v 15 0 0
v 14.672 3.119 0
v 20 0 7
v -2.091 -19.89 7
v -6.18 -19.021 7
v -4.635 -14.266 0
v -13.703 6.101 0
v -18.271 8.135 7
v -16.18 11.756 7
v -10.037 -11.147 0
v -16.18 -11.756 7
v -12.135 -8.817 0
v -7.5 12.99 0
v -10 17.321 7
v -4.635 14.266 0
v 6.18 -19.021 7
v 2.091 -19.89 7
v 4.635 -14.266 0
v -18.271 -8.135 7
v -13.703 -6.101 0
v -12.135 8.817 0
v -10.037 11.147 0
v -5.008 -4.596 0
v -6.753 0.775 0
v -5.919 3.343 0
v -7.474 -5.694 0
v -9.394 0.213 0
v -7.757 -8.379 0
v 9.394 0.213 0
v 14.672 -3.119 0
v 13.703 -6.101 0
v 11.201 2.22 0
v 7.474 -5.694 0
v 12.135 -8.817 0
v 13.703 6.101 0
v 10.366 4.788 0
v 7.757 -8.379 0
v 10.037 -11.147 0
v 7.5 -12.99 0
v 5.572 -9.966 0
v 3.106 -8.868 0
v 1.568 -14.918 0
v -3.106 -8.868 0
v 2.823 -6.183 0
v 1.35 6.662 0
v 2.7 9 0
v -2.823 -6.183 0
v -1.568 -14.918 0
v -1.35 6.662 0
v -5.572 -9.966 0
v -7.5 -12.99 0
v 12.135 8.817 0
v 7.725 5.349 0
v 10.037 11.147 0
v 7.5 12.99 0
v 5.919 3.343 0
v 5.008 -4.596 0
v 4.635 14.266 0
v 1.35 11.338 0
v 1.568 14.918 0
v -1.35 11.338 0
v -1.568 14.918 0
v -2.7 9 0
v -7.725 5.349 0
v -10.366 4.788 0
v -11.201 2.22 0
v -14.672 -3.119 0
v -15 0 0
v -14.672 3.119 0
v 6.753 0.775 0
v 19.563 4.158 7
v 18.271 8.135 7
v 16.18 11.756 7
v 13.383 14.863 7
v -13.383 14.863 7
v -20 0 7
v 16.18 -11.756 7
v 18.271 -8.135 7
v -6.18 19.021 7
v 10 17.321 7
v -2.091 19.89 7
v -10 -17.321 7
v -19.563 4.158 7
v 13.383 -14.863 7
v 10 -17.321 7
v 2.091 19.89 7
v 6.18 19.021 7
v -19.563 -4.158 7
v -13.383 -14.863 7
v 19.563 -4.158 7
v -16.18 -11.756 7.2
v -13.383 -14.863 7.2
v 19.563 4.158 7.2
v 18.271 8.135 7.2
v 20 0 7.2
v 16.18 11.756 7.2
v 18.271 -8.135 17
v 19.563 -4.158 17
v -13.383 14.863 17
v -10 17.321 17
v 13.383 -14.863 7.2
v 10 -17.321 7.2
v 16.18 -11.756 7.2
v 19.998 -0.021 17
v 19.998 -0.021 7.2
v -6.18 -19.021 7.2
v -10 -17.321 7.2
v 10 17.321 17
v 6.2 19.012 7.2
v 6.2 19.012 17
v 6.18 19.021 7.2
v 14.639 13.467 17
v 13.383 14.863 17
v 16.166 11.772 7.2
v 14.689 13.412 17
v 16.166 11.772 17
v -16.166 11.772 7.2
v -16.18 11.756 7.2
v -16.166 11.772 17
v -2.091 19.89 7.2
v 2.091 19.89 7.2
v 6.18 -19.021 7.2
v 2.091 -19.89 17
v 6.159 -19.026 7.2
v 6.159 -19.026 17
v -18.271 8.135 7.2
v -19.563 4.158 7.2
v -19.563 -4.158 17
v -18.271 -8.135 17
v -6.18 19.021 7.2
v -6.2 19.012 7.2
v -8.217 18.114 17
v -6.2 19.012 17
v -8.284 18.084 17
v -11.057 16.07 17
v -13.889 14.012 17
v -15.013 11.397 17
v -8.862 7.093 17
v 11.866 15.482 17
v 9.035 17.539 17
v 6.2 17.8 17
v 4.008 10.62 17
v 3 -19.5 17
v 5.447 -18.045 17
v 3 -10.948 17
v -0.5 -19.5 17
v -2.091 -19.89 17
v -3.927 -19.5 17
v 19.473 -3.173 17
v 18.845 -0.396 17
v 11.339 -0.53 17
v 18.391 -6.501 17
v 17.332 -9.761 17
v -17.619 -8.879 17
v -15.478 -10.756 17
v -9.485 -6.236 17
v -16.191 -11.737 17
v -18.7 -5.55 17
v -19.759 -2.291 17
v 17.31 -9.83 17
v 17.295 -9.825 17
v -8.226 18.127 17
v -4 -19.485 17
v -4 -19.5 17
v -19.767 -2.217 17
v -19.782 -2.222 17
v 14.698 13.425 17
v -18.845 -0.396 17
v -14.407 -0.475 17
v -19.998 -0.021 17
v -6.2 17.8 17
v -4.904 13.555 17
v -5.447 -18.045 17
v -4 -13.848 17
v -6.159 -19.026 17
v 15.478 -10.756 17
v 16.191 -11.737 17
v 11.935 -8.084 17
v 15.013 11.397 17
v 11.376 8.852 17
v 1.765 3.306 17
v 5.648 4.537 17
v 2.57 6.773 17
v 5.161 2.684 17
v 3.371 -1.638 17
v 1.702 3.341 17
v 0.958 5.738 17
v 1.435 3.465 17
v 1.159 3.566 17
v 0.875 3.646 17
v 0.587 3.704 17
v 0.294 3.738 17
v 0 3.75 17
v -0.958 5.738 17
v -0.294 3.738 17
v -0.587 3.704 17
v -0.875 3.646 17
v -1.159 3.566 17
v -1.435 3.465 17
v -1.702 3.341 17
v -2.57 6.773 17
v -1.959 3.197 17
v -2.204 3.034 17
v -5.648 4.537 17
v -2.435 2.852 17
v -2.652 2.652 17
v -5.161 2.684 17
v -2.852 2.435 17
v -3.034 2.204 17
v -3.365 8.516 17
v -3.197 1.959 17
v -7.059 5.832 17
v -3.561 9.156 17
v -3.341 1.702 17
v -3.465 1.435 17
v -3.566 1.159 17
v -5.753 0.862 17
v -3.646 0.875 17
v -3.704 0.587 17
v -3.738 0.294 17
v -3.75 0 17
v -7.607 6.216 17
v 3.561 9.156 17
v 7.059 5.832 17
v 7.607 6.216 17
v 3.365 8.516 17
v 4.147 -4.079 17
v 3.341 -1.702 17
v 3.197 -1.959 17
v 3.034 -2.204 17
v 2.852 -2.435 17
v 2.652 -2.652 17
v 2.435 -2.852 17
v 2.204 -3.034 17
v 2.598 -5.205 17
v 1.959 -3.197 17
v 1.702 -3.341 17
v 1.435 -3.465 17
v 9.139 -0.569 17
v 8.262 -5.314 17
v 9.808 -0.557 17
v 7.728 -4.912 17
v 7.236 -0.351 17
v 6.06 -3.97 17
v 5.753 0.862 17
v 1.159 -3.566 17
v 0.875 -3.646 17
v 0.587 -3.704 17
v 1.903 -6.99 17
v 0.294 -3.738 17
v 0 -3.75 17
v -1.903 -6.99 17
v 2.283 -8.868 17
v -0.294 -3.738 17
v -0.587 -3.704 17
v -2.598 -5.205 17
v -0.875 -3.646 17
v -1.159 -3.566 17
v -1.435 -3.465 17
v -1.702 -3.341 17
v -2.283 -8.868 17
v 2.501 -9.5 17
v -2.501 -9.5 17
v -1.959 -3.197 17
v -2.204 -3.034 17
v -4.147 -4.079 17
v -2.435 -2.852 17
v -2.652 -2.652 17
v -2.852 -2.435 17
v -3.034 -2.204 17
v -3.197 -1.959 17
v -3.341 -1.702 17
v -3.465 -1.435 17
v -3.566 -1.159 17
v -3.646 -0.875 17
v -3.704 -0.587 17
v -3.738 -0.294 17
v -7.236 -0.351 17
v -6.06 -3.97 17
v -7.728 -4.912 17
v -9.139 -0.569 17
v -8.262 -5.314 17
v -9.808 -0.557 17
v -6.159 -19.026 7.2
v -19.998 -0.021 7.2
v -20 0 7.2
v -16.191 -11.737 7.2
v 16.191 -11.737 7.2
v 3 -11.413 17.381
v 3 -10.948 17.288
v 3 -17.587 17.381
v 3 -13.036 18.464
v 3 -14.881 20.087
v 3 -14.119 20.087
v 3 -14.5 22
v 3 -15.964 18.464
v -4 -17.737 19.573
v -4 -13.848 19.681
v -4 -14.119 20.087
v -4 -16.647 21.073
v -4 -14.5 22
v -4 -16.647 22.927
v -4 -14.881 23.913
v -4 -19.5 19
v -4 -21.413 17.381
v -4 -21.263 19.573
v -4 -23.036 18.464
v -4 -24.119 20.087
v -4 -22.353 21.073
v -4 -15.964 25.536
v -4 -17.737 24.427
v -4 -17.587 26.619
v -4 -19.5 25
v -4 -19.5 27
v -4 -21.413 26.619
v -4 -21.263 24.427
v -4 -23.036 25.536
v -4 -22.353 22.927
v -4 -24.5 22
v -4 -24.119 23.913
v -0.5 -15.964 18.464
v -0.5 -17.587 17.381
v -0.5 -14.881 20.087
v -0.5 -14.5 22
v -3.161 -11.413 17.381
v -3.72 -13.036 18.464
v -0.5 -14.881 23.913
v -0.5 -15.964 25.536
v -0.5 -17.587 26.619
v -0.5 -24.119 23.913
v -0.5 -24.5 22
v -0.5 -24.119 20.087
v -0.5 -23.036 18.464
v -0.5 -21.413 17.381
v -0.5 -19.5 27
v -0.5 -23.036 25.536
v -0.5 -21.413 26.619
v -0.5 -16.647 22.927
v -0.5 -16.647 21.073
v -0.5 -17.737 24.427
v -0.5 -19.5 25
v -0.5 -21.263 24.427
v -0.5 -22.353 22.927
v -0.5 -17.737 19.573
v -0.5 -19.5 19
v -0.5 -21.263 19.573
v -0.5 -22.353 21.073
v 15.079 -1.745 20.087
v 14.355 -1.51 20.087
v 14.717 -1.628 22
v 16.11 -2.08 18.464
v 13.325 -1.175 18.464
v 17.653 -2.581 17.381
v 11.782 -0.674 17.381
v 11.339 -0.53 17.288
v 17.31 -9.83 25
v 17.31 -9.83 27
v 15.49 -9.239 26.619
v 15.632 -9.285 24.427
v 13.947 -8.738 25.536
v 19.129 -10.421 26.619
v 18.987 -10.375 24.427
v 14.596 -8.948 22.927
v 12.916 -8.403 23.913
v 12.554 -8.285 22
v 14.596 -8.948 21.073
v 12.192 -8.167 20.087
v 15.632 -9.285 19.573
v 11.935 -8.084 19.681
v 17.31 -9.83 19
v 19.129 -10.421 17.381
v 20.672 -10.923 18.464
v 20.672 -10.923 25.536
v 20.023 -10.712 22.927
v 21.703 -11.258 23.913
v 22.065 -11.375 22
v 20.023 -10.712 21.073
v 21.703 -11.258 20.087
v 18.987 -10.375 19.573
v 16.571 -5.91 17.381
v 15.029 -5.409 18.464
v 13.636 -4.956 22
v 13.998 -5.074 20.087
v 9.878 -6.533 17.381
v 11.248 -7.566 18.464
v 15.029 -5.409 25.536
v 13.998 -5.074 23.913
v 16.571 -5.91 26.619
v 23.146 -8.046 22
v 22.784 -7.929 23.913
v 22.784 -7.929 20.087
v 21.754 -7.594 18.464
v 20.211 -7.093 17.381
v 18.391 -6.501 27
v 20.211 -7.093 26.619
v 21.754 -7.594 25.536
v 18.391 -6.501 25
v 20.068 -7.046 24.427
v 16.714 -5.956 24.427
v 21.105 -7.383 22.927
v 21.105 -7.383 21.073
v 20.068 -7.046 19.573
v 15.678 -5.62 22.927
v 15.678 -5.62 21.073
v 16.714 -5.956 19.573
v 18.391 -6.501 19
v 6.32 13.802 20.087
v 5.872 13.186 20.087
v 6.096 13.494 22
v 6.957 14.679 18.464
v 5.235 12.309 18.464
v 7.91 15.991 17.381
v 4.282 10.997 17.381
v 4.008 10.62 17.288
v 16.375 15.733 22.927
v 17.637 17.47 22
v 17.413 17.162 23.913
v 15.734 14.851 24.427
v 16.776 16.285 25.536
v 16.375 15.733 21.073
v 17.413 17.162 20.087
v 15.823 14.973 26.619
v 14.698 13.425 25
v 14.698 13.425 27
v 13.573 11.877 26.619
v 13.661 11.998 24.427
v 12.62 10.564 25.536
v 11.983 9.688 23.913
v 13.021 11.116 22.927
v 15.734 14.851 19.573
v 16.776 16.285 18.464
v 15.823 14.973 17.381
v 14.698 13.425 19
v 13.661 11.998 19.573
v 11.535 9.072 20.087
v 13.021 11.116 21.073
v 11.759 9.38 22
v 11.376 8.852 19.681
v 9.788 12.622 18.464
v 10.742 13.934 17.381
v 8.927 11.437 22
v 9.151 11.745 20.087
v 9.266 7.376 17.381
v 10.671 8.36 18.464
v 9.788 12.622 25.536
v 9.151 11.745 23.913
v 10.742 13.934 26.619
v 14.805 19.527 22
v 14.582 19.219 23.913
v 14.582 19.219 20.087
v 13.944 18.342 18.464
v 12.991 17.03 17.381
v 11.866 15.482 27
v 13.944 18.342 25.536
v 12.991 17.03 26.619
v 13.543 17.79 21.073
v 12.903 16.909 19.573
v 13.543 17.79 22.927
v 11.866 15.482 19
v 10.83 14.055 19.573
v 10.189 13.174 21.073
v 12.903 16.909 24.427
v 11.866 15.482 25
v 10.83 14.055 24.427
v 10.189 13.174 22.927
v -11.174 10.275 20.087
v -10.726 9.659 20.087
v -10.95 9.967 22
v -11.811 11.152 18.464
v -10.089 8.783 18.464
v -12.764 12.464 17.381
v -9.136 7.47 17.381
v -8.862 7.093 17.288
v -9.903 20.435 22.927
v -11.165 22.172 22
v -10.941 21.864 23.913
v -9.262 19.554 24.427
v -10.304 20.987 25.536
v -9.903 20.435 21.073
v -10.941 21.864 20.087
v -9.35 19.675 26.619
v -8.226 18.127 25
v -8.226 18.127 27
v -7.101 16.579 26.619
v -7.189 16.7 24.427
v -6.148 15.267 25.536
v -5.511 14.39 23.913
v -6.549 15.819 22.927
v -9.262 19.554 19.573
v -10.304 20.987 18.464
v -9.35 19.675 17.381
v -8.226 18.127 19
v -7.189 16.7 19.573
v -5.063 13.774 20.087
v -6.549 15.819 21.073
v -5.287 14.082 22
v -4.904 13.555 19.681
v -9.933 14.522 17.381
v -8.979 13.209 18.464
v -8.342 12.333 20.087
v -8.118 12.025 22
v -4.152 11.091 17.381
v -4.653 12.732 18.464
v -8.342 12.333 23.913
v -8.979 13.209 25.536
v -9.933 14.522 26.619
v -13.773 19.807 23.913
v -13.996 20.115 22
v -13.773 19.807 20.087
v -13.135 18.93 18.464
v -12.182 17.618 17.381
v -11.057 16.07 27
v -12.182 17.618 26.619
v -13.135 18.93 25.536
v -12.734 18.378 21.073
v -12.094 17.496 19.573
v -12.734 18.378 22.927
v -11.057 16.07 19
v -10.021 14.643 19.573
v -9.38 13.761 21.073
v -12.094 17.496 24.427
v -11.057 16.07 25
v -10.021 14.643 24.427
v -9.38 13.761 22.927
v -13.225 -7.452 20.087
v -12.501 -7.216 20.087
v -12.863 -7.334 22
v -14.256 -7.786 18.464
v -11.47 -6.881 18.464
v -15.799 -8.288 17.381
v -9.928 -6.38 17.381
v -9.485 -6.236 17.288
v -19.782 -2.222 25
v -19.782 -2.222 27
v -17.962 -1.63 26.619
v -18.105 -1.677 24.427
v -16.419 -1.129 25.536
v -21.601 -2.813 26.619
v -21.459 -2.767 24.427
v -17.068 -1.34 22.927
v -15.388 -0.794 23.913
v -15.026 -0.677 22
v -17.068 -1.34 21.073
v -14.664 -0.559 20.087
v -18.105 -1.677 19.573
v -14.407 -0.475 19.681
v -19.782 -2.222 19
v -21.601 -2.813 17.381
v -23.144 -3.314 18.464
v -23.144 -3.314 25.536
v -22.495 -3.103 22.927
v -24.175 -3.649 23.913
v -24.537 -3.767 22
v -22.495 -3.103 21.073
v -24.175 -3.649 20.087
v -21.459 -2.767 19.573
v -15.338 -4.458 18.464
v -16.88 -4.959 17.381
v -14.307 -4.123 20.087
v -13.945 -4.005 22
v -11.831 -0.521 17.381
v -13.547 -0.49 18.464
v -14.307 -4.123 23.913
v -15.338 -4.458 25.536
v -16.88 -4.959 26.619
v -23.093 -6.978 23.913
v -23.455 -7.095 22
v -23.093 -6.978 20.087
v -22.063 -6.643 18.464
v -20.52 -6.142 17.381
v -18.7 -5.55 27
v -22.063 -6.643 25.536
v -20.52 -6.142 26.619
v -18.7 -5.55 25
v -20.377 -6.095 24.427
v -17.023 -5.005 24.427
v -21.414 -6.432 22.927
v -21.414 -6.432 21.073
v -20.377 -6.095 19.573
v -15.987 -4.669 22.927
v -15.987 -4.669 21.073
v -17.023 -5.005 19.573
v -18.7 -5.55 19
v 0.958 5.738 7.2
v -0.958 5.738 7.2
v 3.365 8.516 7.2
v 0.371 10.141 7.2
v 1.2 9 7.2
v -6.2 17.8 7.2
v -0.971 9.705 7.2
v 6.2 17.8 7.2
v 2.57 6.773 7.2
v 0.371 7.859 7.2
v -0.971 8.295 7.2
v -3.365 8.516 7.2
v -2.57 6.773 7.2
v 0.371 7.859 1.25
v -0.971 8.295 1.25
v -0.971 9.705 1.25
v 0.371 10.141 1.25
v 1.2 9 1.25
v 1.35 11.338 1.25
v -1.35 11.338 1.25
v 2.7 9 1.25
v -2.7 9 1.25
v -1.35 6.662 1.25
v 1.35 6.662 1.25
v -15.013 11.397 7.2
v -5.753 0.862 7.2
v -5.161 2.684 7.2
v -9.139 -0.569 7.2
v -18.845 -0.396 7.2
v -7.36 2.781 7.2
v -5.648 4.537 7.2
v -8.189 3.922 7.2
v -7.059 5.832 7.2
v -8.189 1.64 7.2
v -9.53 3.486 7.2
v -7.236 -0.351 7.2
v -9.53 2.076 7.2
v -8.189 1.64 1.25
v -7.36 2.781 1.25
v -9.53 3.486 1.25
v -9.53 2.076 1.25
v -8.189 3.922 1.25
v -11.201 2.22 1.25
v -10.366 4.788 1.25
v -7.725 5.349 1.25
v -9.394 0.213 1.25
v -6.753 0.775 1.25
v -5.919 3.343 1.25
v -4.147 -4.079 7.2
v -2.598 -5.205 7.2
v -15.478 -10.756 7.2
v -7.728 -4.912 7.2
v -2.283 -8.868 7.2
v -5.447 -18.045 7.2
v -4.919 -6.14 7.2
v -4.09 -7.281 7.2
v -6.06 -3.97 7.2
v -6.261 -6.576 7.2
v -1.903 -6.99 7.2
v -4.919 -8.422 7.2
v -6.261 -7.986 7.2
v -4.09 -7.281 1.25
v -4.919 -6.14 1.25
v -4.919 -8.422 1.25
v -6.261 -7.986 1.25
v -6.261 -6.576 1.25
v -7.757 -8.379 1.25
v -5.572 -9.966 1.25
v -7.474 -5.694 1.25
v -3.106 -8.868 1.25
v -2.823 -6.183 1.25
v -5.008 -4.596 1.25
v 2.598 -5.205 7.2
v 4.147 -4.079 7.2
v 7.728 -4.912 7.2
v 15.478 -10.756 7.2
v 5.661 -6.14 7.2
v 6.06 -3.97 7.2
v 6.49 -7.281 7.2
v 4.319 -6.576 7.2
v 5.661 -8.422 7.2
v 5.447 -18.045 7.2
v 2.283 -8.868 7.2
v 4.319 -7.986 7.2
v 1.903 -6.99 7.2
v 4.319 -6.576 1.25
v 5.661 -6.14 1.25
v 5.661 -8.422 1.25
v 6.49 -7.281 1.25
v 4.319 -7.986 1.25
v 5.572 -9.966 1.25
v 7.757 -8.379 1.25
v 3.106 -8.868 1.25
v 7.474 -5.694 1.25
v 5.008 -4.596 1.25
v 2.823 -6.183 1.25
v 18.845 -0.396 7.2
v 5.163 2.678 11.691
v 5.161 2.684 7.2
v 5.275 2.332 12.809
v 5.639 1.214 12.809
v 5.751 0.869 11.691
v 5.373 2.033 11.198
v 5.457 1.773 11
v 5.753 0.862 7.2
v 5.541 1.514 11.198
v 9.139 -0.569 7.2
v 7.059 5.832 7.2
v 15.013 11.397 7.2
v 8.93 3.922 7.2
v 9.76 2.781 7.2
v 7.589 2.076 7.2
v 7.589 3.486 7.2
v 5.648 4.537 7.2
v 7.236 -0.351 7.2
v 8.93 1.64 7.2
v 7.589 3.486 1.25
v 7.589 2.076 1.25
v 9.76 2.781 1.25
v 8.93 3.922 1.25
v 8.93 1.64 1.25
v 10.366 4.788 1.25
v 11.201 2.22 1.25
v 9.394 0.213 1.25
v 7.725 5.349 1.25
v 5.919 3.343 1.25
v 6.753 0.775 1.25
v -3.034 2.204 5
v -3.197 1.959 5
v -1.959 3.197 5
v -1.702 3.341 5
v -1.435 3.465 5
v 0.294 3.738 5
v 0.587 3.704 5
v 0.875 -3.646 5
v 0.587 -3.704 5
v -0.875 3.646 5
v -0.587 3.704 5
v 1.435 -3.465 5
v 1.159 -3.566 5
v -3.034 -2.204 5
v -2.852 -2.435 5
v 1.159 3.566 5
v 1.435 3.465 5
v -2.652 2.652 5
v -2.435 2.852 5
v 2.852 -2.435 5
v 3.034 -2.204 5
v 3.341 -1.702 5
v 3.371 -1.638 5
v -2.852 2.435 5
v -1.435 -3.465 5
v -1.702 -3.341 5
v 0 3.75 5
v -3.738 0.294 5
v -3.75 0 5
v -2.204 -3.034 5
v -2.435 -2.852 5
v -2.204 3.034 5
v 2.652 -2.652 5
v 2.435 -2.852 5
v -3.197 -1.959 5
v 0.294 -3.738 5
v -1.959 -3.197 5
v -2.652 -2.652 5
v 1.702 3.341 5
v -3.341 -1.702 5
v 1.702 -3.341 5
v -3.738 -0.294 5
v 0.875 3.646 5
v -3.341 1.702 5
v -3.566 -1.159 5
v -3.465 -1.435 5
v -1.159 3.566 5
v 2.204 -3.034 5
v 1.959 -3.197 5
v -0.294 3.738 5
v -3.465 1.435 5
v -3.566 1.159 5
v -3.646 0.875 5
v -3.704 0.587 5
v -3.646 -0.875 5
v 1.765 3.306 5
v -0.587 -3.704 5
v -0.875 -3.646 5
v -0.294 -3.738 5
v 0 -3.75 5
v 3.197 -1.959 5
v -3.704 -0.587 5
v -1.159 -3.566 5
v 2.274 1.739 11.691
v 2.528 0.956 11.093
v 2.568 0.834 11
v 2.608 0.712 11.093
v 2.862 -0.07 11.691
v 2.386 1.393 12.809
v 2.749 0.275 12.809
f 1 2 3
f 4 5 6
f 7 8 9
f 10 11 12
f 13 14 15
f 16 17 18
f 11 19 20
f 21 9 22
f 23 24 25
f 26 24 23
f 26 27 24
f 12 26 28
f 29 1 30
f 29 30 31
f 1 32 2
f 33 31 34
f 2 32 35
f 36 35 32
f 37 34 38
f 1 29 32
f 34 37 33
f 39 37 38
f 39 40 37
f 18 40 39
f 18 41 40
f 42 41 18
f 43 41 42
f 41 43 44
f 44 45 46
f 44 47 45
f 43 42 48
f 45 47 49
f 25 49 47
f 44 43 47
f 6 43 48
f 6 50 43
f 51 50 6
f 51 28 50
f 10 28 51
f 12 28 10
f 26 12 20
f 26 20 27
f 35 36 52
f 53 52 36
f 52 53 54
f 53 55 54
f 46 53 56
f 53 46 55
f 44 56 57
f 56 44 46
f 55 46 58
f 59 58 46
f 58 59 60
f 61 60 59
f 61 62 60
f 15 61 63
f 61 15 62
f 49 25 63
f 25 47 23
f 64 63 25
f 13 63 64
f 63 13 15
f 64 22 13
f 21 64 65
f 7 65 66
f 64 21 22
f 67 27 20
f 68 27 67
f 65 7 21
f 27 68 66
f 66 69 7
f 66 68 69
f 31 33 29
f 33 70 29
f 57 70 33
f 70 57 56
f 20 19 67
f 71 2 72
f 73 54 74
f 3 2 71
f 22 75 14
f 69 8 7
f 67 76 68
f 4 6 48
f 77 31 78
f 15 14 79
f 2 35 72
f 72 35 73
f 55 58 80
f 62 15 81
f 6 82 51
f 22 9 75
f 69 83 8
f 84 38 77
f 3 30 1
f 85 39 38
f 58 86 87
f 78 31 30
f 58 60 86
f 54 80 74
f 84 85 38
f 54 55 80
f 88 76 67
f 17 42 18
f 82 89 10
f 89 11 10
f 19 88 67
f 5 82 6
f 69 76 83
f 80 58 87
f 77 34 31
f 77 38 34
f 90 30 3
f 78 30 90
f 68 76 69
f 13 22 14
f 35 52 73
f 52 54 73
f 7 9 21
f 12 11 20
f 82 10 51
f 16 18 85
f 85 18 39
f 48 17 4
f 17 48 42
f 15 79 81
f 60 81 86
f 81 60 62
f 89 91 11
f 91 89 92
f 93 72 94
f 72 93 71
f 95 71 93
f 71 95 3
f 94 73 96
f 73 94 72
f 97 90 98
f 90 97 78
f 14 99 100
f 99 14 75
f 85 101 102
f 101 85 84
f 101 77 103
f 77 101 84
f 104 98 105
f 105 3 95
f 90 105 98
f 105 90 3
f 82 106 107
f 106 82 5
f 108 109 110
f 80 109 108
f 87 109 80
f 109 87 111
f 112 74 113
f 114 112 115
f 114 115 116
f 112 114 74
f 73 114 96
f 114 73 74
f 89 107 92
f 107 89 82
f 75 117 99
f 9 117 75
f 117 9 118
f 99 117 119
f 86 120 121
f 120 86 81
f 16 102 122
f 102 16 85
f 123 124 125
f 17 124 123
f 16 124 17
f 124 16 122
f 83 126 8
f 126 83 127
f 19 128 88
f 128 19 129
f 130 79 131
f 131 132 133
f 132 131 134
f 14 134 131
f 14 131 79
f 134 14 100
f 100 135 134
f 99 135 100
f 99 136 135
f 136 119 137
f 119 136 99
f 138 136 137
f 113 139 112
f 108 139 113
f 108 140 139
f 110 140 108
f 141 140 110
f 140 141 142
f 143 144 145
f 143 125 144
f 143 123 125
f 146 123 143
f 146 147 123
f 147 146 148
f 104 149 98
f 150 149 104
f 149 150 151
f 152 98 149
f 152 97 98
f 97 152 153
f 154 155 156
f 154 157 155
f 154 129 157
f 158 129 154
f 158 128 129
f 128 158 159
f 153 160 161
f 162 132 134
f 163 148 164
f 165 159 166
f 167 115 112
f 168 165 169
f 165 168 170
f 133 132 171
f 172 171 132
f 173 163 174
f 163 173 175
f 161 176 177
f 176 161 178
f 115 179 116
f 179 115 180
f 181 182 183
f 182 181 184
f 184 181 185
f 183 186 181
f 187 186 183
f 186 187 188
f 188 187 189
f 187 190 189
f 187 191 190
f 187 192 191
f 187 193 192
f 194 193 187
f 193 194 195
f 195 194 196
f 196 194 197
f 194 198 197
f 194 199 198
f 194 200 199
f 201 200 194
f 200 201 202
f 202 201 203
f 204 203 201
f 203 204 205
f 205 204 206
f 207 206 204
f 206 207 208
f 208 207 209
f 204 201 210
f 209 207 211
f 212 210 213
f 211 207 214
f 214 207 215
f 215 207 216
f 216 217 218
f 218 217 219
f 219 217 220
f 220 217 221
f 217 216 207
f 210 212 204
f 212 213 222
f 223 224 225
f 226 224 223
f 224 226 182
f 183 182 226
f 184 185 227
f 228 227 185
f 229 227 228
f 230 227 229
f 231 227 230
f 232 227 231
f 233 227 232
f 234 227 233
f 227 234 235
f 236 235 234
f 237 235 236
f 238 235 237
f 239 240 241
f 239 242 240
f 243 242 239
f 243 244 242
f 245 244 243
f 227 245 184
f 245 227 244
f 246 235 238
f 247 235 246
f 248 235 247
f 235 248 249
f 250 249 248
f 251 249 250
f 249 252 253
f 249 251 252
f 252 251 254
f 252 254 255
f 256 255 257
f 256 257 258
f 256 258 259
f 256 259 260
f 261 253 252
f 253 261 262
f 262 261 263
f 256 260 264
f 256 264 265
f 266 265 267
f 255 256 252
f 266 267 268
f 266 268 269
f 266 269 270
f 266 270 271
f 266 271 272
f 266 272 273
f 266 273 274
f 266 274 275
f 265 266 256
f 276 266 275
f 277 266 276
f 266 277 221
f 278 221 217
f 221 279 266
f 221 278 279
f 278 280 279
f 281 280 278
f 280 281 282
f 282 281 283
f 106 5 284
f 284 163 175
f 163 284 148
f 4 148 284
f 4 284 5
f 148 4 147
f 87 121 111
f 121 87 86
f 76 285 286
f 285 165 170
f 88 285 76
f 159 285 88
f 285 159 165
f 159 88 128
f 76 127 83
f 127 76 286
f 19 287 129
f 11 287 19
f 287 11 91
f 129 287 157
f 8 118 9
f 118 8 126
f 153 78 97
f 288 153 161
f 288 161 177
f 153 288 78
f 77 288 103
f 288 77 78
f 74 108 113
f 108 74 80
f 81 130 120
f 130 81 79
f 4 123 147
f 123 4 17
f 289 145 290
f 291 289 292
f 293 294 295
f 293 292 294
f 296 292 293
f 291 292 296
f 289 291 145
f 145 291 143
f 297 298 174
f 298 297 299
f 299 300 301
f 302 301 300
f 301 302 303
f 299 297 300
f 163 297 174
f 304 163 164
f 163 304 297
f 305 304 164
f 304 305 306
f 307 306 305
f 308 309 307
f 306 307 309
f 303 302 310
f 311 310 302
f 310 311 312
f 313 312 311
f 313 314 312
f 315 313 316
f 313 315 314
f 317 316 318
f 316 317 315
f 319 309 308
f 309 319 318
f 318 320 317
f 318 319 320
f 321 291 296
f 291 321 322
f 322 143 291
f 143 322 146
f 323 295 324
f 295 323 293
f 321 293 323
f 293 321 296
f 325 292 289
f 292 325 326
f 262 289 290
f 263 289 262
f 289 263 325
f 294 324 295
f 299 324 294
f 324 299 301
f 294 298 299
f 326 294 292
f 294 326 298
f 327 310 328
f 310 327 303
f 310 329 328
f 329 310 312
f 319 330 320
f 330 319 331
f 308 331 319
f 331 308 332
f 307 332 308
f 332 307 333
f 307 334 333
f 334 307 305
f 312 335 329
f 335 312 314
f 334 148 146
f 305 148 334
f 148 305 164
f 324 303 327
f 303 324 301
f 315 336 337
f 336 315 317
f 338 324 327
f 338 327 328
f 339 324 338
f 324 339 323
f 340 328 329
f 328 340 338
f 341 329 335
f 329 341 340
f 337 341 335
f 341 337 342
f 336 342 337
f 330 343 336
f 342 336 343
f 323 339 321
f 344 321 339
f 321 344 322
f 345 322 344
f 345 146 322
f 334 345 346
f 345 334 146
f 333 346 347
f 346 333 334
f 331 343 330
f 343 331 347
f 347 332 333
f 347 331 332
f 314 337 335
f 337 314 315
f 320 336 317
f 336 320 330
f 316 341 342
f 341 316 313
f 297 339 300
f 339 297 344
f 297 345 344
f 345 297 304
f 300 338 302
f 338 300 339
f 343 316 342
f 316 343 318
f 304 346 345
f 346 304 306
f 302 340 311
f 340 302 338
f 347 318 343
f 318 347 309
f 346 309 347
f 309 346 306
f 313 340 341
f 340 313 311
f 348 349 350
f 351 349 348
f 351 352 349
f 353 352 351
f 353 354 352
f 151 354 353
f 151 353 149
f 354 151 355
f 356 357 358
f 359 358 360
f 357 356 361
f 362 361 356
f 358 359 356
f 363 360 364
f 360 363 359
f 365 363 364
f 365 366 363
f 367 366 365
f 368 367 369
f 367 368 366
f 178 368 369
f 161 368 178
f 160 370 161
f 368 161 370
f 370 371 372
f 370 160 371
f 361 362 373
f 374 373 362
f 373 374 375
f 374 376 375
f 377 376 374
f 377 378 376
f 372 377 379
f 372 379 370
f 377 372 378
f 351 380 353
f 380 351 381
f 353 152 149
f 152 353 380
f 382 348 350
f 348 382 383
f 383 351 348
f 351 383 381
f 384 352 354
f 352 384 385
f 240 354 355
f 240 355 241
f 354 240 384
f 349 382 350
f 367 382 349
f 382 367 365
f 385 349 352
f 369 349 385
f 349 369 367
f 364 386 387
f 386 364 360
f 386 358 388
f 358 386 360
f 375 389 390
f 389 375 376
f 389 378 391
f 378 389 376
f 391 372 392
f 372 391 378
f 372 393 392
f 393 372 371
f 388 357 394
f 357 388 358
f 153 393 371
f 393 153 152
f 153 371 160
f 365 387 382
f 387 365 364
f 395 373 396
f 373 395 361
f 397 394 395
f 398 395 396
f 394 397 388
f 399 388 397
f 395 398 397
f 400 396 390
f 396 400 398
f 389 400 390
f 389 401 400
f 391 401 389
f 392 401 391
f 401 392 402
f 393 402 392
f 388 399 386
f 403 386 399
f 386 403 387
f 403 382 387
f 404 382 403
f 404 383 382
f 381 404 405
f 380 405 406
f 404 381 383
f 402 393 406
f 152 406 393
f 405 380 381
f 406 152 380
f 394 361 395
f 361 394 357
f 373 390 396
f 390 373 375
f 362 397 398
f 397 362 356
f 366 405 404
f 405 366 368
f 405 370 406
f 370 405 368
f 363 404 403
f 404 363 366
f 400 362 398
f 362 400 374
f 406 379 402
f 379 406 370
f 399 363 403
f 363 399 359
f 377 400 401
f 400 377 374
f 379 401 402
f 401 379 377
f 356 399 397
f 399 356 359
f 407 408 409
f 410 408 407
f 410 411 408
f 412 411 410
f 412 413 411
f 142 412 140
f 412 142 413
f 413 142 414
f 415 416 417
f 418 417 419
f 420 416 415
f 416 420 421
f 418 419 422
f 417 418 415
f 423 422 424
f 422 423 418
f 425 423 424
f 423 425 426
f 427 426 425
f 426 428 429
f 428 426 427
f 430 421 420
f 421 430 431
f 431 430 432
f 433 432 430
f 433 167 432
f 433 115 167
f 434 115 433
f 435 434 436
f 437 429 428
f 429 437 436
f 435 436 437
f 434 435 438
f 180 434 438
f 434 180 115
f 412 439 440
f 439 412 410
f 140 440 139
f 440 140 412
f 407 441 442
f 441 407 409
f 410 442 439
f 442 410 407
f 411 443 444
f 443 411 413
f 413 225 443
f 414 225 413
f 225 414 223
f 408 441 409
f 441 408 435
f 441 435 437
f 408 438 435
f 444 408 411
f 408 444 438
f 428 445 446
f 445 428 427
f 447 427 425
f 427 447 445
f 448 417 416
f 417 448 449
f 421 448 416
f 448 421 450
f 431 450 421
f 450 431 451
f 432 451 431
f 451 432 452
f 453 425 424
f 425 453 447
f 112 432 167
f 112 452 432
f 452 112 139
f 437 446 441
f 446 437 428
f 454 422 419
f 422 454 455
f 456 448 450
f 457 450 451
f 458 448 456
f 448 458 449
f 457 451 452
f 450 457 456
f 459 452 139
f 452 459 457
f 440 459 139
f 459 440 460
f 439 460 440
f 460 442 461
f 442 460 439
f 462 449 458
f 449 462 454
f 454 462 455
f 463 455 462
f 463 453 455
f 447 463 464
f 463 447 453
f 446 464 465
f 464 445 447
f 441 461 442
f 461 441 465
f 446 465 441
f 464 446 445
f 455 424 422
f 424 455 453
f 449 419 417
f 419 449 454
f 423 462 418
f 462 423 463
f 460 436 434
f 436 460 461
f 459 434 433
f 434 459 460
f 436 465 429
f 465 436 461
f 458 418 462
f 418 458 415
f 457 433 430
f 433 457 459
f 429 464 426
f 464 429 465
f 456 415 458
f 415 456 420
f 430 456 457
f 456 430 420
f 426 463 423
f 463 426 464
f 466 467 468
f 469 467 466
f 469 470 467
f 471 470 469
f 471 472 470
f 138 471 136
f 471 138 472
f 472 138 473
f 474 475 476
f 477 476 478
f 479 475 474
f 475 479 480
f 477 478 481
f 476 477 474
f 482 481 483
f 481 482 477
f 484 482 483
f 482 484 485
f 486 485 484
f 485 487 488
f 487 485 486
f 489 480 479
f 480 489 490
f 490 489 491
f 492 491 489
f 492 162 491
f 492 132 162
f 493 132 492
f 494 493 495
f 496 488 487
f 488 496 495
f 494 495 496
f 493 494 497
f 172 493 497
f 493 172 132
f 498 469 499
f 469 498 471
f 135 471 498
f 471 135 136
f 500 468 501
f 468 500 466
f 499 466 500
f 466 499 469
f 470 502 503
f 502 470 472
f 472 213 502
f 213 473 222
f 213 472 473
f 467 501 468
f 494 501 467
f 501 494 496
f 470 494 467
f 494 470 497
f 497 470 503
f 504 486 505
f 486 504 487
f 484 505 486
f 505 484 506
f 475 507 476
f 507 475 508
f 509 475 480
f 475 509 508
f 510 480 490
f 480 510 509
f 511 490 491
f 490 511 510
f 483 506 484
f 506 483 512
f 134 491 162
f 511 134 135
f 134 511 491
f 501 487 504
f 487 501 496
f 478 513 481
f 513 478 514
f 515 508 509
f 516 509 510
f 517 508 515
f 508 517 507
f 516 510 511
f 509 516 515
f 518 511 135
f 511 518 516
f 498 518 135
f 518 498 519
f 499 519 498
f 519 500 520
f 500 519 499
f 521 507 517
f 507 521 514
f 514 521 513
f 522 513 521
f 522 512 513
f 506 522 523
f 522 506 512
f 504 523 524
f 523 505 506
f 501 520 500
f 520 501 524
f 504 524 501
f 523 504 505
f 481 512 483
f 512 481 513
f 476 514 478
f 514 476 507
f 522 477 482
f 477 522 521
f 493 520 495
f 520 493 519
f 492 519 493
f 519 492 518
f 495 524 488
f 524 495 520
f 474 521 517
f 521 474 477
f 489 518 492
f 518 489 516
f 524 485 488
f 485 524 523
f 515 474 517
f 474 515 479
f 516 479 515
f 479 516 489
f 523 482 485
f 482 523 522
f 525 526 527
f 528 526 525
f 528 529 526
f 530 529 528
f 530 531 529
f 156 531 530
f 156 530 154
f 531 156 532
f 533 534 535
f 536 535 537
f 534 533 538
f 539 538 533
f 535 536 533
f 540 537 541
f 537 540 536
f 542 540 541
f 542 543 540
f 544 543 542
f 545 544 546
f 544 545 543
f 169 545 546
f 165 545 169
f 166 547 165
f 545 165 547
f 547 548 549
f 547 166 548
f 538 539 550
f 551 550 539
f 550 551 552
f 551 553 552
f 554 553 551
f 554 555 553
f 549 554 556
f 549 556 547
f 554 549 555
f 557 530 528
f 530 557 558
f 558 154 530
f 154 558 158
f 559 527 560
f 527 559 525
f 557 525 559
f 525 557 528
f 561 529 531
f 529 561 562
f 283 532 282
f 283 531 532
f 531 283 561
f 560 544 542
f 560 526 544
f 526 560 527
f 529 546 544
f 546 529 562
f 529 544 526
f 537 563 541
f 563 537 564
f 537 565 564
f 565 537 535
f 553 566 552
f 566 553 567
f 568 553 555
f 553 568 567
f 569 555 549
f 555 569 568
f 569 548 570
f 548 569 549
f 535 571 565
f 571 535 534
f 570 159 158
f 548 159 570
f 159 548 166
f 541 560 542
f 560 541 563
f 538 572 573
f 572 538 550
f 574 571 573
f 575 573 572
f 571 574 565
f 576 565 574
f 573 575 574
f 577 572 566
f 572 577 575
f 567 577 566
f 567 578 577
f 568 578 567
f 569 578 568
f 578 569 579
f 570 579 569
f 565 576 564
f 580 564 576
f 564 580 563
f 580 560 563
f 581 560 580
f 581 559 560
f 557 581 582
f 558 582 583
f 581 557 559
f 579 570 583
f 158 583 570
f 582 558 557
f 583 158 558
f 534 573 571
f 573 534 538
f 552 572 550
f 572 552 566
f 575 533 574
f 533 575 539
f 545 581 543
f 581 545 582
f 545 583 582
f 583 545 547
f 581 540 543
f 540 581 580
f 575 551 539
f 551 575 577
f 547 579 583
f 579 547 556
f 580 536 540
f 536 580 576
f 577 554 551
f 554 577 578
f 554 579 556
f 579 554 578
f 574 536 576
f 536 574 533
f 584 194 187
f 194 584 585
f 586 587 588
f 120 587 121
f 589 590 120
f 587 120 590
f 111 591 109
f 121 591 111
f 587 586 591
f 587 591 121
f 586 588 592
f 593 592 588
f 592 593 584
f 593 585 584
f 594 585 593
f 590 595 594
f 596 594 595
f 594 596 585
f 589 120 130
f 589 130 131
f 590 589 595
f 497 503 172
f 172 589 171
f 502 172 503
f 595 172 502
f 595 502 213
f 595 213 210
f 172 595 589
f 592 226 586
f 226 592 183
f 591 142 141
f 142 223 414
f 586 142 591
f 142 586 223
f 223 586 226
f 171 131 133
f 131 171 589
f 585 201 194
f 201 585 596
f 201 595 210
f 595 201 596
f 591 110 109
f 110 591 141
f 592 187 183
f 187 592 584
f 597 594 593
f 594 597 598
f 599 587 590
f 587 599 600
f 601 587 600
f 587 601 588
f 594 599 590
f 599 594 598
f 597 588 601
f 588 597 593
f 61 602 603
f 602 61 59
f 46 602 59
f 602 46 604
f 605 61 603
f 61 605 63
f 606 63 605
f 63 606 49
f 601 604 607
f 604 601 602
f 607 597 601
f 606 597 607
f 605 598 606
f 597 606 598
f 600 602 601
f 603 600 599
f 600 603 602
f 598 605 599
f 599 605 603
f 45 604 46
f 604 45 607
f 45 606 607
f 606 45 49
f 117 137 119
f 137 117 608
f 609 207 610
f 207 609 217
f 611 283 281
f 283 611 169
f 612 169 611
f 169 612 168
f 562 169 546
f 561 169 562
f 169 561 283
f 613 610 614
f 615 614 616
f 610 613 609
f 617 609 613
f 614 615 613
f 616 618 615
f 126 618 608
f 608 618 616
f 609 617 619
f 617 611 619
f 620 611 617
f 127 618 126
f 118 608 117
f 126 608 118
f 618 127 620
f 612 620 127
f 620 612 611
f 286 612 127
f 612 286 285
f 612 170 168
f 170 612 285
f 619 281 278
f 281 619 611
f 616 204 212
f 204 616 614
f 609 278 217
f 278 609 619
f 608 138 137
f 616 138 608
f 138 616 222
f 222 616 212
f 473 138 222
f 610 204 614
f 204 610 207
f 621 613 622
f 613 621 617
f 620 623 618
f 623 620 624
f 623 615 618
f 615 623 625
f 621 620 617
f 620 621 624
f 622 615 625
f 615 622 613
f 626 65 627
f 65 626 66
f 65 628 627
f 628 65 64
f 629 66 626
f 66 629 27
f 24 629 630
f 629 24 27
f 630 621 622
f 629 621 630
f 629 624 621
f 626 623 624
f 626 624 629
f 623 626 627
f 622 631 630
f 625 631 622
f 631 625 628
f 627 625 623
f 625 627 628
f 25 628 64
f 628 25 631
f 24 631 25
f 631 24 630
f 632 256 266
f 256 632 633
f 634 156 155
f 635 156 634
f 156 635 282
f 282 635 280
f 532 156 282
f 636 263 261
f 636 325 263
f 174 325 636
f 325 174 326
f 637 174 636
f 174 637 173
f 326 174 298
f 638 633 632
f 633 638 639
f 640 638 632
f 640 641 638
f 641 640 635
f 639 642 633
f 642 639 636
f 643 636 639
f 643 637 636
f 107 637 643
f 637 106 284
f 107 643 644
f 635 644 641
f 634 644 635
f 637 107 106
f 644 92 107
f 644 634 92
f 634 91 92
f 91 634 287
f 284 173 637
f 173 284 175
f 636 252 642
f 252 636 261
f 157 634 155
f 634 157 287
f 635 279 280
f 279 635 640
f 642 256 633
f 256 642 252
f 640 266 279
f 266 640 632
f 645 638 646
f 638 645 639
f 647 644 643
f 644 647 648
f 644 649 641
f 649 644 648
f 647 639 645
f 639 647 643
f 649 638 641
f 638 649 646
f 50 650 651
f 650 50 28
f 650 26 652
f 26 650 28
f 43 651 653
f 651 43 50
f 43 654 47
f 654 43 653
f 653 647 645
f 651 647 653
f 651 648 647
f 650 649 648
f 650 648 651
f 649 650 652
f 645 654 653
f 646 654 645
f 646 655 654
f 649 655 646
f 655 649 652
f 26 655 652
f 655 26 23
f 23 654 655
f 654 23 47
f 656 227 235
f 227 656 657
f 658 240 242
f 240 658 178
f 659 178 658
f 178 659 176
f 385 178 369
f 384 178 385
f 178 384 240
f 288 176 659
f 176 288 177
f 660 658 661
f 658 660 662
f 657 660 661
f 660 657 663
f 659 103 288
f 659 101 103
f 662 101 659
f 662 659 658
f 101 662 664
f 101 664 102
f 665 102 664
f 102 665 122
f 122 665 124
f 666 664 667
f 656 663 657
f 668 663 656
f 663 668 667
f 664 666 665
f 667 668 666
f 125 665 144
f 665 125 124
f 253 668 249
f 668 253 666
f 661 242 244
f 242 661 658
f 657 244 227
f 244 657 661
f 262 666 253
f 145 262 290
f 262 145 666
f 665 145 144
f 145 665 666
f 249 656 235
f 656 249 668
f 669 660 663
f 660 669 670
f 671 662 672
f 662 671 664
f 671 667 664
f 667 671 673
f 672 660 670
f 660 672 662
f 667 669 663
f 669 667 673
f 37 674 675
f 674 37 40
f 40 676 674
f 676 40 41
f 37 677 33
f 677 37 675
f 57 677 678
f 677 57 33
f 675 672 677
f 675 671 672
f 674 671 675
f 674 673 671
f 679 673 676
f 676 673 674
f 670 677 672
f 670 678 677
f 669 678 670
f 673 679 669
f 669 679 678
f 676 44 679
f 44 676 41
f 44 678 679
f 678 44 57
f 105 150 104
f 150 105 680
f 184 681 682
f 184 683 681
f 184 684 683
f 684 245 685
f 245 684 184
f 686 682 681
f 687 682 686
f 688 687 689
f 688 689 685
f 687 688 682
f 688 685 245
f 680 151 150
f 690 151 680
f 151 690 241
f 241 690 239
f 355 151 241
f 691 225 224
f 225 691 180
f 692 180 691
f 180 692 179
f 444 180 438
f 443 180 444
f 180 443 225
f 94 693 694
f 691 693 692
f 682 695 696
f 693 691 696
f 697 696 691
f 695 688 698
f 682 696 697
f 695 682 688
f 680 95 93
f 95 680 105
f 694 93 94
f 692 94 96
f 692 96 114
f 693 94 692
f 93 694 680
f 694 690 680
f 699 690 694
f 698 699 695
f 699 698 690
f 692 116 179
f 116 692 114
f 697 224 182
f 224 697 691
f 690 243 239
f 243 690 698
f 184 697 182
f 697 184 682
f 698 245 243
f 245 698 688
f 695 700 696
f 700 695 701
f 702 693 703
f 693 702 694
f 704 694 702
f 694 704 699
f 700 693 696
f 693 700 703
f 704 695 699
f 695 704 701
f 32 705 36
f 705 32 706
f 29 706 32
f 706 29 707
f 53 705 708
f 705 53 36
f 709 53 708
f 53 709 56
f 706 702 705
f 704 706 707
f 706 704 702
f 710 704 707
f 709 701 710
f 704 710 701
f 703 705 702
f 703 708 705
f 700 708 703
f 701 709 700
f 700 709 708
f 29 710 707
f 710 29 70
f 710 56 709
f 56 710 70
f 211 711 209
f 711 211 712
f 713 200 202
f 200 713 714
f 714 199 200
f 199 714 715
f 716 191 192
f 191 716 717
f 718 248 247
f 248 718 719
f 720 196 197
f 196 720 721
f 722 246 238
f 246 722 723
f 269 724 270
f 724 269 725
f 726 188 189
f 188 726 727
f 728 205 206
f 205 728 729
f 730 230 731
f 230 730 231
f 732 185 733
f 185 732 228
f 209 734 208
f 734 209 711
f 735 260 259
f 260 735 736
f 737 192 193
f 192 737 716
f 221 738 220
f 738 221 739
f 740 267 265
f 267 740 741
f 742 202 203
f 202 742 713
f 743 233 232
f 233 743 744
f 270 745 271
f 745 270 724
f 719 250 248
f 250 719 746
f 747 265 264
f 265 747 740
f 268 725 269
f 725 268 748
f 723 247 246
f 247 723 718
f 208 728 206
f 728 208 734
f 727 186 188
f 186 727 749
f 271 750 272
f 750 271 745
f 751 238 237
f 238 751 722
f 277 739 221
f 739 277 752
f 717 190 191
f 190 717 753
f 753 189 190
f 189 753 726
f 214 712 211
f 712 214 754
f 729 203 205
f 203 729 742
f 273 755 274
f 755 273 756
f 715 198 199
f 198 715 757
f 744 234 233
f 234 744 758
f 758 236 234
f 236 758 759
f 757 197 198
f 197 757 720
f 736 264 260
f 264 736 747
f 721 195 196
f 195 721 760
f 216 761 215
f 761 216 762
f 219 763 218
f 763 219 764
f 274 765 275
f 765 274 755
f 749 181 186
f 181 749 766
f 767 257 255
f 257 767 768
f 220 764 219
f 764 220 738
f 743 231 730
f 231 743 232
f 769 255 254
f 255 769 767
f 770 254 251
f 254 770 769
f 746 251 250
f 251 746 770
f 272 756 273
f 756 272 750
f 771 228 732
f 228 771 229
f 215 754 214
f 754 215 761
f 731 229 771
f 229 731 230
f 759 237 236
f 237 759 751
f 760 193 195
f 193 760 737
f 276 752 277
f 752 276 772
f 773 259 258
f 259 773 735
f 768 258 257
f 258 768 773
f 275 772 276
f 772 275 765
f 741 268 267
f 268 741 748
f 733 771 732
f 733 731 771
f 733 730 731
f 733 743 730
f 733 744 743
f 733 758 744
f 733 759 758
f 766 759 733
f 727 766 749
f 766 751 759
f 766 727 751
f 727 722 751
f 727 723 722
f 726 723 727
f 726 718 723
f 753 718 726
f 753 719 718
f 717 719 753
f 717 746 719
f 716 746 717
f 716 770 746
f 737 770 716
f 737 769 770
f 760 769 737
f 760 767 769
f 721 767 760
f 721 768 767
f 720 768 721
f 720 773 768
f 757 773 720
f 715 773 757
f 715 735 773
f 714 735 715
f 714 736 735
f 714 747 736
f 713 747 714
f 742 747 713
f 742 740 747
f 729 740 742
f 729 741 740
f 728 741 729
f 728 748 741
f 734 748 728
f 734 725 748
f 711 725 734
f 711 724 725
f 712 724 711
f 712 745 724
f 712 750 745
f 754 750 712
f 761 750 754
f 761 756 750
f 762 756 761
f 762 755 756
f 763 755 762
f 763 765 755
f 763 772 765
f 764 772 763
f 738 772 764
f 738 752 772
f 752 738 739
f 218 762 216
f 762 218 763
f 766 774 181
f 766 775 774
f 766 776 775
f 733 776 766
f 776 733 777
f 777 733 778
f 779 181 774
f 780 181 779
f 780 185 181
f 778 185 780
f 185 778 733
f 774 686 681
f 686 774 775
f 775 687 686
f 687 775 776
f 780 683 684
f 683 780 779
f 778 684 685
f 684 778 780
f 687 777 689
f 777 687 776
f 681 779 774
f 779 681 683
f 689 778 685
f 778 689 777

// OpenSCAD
// file: blade.scad
module blade()
{
    difference()
    {
        minkowski()
        {
            difference()
            {

                cube(size = [ 30, 60, 1.5 ], center = true);
                translate(v = [ 210, 0, -3 ]) cylinder(h = 6, r = 200);
                translate(v = [ -25, 0, 0 ]) scale([ 1, 1, 2 ]) difference()
                {
                    cube(size = [ 30, 60, 1.5 ], center = true);
                    translate(v = [ 210, 0, -3 ]) cylinder(h = 6, r = 200);
                }
                translate(v = [ 0, -125, -3 ]) cylinder(h = 6, r = 100);
                translate(v = [ 0, 55, 0 ]) scale([ 1, 1, 2 ]) difference()
                {
                    cube(size = [ 30, 60, 1.5 ], center = true);
                    translate(v = [ 0, -125, -3 ]) cylinder(h = 6, r = 100);
                }
            }
            translate(v = [ 0, 0, -.1 ]) cylinder(h = 0.2, r = 5);
        }

        translate(v = [ 0, -7, 0 ]) rotate([ 0, 0, 90 ]) cylinder(h = 20, r = 1.2, center = true);
        translate(v = [ 0, -22, 0 ]) rotate([ 0, 0, 90 ]) cylinder(h = 20, r = 1.2, center = true);
    }
}

blade();
// file: shafts_linker.scad
$fn=80;

module cycy()
{
    difference()
    {
        cylinder(h = 40, r = 8, center = true);
        translate(v = [ 0, 0, -19.95 ]) cylinder(h = 40, r = 2.85, center = true);
    }
}
module shaft()
{
    difference()
    {
        cylinder(h = 50, r = 3.75);
        translate(v = [ 2.7, -10, -0.1 ]) cube(size = 16);
    }
}
module shaft_linkers()
{
    difference()
    {
        cycy();
        shaft();
        translate(v = [ 0, 0, 7 ]) rotate(a = 90, v = [ 0, 1, 0 ]) cylinder(h = 60, r = 1, center = true);
        translate(v = [ 0, 0, -7 ]) rotate(a = 90, v = [ 0, 1, 0 ]) cylinder(h = 60, r = 1, center = true);
    }
}

shaft_linkers();
// file: blade_holder_holder.scad
module blade_holder_holder_hull(tolerence)
{
    hull()
    {
        circle(r = 3+tolerence);
        translate(v = [15, 0, 0]) square(size = 12+tolerence, center=true);
    }
}

module blade_holder_holder()   
{
    difference() {
        linear_extrude(height = 12)
        { 
            blade_holder_holder_hull(0);

        }
        translate(v=[0, 0, 8]) cube(size = 12, center=true);
        translate(v = [8, 0, 6]) rotate(a = 90, v = [0, 1, 0]) cylinder(h = 20, r = 5.2);
        translate(v = [0, 0, 6]) rotate(a = 90, v = [0, 1, 0]) cylinder(h = 20, r = 3);

        translate(v = [0, 0, -15]) cylinder(h = 30, r = 1.2);

        translate(v = [0, 0, 6]) 
        difference() {
            translate(v = [12, 0, 10]) 
            cube(20, center=true);
            rotate(90,v =[0, 1, 0])
            cylinder(h = 30, r = 6.5);
        }
    }
}

blade_holder_holder();
// file: blade_holder.scad
use <arm_pins.scad>
use <blade.scad>

module blade_holder(blade_size, blade_width)
{
    difference()
    {
        cylinder(h = 60, r = 4.9);
        translate(v = [ 0, 0, 2 ]) cylinder(h = 60, r = 4);
        translate(v = [ 0, 0, -2 ]) cylinder(h = 10, r = 3);
        translate(v = [ 0, 0, 55 ]) cube(size = [ blade_size, blade_width, blade_size ], center = true);
        translate(v = [ 0, 0, 15.5 ]) rotate(a = 90, v = [ 0, 1, 0 ]) cylinder(h = 6, r = 1.2);
        translate(v = [ 0, 0, 35 ]) rotate(90, [ 1, 0, 0 ]) cylinder(h = 20, r = 1.2, center = true);
        translate(v = [ 0, 0, 50 ]) rotate(90, [ 1, 0, 0 ]) cylinder(h = 20, r = 1.2, center = true);
    }
}

module blade_holder_strengthener(height, blade_size)
{
    difference()
    {
        cylinder(h = height, r = 3.5);
        translate(v = [ -(height + 2) / 2, -(blade_size / 2), -1 ]) cube(size = [ height + 2, height + 2, height + 2 ]);
    }
}

difference()
{
    union()
    {
        blade_holder(70, 2.3);

        *translate(v = [ 0, 0, 30 ]) //
            blade_holder_strengthener(50, 2.5);

        translate(v = [ 0, 0, 0 ])           //
            translate(v = [ 0, 0, .5 ])      //
            rotate(a = 180, v = [ 1, 0, 0 ]) //
            arm_pin(4, 2.7, 3.4);

        translate(v = [ 0, 0, 57 ]) rotate(a = 90, v = [ 1, 0, 0 ]) blade();
    }
    *translate(v = [ -100, 0, 40 ]) cube(size = [ 200, 200, 200 ], center = true);
}
// file: arm_pins.scad
use <arm_holder.scad>

module arm_pin(height, radius, hat_radius)
{
    difference()
    {
        union()
        {
            cylinder(h = height, r = radius, center = true);
            translate(v = [ 0, 0, -height / 2 - 1 ]) cylinder(h = 2, r = hat_radius, center = true);
        }
        cylinder(h = 20, r = 1.4, center = true);
        translate(v = [ -2, -2, 2 ]) cube(size = 4.2, center = true);
        translate(v = [ 2, 2, 2 ]) cube(size = 4.2, center = true);
    }
}

arm_pin(3.5, 2.7, 3.7);
// file: arm_holder.scad
module arm_holder(external_radius, internal_radius, width, tolerence)
{
    union()
    {
        scale(v = [1, 1, 2]) union() {
            difference() {
                cube(size = [external_radius, external_radius, width]);
                translate(v = [0, 0, width/2]) cylinder(h = width*2, r = external_radius, center = true);
            }
            translate(v = [0, external_radius*2, 0]) mirror(v = [0, 1, 0])  difference() {
                cube(size = [external_radius, external_radius, width]);
                translate(v = [0, 0, width/2]) cylinder(h = width*2, r = external_radius, center = true);
            }
        }

        difference()
        {
            translate(v = [0, 0, width/2]) cylinder(h = width, r = external_radius, center = true);
            cylinder(h = 13, r = internal_radius, center = true);
        }
    }
}


rotate(a = 90, v = [0, 1, 0]) arm_holder(5, 3, 4, .1);
// main file
use <arm_holder.scad>
use <arm_pins.scad>
use <blade_holder.scad>
use <blade_holder_holder.scad>
use <shafts_linker.scad>

module center_holder()
{
    difference() 
    {
        union() {

            difference() {
                union() {
                    cylinder(h = 7, r1 = 15, r2=20);
                    translate(v = [0, 0, 7]) cylinder(h = 10, r=20);
                }
            }
            for (i = [0:(360 / 5):360])
            {
                rotate(i)
                {
                    translate(v = [-4, -19.5, 22]){
                        rotate([0, 90, 0]) arm_holder(5, 3, 3.5, .1);;
                    }
                }
            }
        }
        for (i = [0:(360 / 5):360])
        {
            rotate(i)
            {
                translate(v = [0, 9, 7.2])
                rotate(a = 90, v = [0, 0, 1]) 
                linear_extrude(height = 15) 
                {
                    blade_holder_holder_hull(.4);
                }
                translate(v = [0, 9, -1]) 
                cylinder(h = 30, r = 1.2);
                translate(v = [0, 9, 0]) cylinder(h = 2.5, r = 2.7, center=true, $fn=6);
            }
        }
        rotate(a = 180/10, v = [0, 0, 1]) translate(v = [0, 0, 5]) shaft();
        translate(v = [0, 0, 12]) rotate(a = 180/10, v = [0, 0, 1]) rotate(a = 90, v = [0, 1, 0]) cylinder(h = 20, r = 1);
    }
}

difference() 
{
    center_holder();
    //translate(v = [-100, 0, 0]) cube(size = [200, 200, 200], center=true);
}
